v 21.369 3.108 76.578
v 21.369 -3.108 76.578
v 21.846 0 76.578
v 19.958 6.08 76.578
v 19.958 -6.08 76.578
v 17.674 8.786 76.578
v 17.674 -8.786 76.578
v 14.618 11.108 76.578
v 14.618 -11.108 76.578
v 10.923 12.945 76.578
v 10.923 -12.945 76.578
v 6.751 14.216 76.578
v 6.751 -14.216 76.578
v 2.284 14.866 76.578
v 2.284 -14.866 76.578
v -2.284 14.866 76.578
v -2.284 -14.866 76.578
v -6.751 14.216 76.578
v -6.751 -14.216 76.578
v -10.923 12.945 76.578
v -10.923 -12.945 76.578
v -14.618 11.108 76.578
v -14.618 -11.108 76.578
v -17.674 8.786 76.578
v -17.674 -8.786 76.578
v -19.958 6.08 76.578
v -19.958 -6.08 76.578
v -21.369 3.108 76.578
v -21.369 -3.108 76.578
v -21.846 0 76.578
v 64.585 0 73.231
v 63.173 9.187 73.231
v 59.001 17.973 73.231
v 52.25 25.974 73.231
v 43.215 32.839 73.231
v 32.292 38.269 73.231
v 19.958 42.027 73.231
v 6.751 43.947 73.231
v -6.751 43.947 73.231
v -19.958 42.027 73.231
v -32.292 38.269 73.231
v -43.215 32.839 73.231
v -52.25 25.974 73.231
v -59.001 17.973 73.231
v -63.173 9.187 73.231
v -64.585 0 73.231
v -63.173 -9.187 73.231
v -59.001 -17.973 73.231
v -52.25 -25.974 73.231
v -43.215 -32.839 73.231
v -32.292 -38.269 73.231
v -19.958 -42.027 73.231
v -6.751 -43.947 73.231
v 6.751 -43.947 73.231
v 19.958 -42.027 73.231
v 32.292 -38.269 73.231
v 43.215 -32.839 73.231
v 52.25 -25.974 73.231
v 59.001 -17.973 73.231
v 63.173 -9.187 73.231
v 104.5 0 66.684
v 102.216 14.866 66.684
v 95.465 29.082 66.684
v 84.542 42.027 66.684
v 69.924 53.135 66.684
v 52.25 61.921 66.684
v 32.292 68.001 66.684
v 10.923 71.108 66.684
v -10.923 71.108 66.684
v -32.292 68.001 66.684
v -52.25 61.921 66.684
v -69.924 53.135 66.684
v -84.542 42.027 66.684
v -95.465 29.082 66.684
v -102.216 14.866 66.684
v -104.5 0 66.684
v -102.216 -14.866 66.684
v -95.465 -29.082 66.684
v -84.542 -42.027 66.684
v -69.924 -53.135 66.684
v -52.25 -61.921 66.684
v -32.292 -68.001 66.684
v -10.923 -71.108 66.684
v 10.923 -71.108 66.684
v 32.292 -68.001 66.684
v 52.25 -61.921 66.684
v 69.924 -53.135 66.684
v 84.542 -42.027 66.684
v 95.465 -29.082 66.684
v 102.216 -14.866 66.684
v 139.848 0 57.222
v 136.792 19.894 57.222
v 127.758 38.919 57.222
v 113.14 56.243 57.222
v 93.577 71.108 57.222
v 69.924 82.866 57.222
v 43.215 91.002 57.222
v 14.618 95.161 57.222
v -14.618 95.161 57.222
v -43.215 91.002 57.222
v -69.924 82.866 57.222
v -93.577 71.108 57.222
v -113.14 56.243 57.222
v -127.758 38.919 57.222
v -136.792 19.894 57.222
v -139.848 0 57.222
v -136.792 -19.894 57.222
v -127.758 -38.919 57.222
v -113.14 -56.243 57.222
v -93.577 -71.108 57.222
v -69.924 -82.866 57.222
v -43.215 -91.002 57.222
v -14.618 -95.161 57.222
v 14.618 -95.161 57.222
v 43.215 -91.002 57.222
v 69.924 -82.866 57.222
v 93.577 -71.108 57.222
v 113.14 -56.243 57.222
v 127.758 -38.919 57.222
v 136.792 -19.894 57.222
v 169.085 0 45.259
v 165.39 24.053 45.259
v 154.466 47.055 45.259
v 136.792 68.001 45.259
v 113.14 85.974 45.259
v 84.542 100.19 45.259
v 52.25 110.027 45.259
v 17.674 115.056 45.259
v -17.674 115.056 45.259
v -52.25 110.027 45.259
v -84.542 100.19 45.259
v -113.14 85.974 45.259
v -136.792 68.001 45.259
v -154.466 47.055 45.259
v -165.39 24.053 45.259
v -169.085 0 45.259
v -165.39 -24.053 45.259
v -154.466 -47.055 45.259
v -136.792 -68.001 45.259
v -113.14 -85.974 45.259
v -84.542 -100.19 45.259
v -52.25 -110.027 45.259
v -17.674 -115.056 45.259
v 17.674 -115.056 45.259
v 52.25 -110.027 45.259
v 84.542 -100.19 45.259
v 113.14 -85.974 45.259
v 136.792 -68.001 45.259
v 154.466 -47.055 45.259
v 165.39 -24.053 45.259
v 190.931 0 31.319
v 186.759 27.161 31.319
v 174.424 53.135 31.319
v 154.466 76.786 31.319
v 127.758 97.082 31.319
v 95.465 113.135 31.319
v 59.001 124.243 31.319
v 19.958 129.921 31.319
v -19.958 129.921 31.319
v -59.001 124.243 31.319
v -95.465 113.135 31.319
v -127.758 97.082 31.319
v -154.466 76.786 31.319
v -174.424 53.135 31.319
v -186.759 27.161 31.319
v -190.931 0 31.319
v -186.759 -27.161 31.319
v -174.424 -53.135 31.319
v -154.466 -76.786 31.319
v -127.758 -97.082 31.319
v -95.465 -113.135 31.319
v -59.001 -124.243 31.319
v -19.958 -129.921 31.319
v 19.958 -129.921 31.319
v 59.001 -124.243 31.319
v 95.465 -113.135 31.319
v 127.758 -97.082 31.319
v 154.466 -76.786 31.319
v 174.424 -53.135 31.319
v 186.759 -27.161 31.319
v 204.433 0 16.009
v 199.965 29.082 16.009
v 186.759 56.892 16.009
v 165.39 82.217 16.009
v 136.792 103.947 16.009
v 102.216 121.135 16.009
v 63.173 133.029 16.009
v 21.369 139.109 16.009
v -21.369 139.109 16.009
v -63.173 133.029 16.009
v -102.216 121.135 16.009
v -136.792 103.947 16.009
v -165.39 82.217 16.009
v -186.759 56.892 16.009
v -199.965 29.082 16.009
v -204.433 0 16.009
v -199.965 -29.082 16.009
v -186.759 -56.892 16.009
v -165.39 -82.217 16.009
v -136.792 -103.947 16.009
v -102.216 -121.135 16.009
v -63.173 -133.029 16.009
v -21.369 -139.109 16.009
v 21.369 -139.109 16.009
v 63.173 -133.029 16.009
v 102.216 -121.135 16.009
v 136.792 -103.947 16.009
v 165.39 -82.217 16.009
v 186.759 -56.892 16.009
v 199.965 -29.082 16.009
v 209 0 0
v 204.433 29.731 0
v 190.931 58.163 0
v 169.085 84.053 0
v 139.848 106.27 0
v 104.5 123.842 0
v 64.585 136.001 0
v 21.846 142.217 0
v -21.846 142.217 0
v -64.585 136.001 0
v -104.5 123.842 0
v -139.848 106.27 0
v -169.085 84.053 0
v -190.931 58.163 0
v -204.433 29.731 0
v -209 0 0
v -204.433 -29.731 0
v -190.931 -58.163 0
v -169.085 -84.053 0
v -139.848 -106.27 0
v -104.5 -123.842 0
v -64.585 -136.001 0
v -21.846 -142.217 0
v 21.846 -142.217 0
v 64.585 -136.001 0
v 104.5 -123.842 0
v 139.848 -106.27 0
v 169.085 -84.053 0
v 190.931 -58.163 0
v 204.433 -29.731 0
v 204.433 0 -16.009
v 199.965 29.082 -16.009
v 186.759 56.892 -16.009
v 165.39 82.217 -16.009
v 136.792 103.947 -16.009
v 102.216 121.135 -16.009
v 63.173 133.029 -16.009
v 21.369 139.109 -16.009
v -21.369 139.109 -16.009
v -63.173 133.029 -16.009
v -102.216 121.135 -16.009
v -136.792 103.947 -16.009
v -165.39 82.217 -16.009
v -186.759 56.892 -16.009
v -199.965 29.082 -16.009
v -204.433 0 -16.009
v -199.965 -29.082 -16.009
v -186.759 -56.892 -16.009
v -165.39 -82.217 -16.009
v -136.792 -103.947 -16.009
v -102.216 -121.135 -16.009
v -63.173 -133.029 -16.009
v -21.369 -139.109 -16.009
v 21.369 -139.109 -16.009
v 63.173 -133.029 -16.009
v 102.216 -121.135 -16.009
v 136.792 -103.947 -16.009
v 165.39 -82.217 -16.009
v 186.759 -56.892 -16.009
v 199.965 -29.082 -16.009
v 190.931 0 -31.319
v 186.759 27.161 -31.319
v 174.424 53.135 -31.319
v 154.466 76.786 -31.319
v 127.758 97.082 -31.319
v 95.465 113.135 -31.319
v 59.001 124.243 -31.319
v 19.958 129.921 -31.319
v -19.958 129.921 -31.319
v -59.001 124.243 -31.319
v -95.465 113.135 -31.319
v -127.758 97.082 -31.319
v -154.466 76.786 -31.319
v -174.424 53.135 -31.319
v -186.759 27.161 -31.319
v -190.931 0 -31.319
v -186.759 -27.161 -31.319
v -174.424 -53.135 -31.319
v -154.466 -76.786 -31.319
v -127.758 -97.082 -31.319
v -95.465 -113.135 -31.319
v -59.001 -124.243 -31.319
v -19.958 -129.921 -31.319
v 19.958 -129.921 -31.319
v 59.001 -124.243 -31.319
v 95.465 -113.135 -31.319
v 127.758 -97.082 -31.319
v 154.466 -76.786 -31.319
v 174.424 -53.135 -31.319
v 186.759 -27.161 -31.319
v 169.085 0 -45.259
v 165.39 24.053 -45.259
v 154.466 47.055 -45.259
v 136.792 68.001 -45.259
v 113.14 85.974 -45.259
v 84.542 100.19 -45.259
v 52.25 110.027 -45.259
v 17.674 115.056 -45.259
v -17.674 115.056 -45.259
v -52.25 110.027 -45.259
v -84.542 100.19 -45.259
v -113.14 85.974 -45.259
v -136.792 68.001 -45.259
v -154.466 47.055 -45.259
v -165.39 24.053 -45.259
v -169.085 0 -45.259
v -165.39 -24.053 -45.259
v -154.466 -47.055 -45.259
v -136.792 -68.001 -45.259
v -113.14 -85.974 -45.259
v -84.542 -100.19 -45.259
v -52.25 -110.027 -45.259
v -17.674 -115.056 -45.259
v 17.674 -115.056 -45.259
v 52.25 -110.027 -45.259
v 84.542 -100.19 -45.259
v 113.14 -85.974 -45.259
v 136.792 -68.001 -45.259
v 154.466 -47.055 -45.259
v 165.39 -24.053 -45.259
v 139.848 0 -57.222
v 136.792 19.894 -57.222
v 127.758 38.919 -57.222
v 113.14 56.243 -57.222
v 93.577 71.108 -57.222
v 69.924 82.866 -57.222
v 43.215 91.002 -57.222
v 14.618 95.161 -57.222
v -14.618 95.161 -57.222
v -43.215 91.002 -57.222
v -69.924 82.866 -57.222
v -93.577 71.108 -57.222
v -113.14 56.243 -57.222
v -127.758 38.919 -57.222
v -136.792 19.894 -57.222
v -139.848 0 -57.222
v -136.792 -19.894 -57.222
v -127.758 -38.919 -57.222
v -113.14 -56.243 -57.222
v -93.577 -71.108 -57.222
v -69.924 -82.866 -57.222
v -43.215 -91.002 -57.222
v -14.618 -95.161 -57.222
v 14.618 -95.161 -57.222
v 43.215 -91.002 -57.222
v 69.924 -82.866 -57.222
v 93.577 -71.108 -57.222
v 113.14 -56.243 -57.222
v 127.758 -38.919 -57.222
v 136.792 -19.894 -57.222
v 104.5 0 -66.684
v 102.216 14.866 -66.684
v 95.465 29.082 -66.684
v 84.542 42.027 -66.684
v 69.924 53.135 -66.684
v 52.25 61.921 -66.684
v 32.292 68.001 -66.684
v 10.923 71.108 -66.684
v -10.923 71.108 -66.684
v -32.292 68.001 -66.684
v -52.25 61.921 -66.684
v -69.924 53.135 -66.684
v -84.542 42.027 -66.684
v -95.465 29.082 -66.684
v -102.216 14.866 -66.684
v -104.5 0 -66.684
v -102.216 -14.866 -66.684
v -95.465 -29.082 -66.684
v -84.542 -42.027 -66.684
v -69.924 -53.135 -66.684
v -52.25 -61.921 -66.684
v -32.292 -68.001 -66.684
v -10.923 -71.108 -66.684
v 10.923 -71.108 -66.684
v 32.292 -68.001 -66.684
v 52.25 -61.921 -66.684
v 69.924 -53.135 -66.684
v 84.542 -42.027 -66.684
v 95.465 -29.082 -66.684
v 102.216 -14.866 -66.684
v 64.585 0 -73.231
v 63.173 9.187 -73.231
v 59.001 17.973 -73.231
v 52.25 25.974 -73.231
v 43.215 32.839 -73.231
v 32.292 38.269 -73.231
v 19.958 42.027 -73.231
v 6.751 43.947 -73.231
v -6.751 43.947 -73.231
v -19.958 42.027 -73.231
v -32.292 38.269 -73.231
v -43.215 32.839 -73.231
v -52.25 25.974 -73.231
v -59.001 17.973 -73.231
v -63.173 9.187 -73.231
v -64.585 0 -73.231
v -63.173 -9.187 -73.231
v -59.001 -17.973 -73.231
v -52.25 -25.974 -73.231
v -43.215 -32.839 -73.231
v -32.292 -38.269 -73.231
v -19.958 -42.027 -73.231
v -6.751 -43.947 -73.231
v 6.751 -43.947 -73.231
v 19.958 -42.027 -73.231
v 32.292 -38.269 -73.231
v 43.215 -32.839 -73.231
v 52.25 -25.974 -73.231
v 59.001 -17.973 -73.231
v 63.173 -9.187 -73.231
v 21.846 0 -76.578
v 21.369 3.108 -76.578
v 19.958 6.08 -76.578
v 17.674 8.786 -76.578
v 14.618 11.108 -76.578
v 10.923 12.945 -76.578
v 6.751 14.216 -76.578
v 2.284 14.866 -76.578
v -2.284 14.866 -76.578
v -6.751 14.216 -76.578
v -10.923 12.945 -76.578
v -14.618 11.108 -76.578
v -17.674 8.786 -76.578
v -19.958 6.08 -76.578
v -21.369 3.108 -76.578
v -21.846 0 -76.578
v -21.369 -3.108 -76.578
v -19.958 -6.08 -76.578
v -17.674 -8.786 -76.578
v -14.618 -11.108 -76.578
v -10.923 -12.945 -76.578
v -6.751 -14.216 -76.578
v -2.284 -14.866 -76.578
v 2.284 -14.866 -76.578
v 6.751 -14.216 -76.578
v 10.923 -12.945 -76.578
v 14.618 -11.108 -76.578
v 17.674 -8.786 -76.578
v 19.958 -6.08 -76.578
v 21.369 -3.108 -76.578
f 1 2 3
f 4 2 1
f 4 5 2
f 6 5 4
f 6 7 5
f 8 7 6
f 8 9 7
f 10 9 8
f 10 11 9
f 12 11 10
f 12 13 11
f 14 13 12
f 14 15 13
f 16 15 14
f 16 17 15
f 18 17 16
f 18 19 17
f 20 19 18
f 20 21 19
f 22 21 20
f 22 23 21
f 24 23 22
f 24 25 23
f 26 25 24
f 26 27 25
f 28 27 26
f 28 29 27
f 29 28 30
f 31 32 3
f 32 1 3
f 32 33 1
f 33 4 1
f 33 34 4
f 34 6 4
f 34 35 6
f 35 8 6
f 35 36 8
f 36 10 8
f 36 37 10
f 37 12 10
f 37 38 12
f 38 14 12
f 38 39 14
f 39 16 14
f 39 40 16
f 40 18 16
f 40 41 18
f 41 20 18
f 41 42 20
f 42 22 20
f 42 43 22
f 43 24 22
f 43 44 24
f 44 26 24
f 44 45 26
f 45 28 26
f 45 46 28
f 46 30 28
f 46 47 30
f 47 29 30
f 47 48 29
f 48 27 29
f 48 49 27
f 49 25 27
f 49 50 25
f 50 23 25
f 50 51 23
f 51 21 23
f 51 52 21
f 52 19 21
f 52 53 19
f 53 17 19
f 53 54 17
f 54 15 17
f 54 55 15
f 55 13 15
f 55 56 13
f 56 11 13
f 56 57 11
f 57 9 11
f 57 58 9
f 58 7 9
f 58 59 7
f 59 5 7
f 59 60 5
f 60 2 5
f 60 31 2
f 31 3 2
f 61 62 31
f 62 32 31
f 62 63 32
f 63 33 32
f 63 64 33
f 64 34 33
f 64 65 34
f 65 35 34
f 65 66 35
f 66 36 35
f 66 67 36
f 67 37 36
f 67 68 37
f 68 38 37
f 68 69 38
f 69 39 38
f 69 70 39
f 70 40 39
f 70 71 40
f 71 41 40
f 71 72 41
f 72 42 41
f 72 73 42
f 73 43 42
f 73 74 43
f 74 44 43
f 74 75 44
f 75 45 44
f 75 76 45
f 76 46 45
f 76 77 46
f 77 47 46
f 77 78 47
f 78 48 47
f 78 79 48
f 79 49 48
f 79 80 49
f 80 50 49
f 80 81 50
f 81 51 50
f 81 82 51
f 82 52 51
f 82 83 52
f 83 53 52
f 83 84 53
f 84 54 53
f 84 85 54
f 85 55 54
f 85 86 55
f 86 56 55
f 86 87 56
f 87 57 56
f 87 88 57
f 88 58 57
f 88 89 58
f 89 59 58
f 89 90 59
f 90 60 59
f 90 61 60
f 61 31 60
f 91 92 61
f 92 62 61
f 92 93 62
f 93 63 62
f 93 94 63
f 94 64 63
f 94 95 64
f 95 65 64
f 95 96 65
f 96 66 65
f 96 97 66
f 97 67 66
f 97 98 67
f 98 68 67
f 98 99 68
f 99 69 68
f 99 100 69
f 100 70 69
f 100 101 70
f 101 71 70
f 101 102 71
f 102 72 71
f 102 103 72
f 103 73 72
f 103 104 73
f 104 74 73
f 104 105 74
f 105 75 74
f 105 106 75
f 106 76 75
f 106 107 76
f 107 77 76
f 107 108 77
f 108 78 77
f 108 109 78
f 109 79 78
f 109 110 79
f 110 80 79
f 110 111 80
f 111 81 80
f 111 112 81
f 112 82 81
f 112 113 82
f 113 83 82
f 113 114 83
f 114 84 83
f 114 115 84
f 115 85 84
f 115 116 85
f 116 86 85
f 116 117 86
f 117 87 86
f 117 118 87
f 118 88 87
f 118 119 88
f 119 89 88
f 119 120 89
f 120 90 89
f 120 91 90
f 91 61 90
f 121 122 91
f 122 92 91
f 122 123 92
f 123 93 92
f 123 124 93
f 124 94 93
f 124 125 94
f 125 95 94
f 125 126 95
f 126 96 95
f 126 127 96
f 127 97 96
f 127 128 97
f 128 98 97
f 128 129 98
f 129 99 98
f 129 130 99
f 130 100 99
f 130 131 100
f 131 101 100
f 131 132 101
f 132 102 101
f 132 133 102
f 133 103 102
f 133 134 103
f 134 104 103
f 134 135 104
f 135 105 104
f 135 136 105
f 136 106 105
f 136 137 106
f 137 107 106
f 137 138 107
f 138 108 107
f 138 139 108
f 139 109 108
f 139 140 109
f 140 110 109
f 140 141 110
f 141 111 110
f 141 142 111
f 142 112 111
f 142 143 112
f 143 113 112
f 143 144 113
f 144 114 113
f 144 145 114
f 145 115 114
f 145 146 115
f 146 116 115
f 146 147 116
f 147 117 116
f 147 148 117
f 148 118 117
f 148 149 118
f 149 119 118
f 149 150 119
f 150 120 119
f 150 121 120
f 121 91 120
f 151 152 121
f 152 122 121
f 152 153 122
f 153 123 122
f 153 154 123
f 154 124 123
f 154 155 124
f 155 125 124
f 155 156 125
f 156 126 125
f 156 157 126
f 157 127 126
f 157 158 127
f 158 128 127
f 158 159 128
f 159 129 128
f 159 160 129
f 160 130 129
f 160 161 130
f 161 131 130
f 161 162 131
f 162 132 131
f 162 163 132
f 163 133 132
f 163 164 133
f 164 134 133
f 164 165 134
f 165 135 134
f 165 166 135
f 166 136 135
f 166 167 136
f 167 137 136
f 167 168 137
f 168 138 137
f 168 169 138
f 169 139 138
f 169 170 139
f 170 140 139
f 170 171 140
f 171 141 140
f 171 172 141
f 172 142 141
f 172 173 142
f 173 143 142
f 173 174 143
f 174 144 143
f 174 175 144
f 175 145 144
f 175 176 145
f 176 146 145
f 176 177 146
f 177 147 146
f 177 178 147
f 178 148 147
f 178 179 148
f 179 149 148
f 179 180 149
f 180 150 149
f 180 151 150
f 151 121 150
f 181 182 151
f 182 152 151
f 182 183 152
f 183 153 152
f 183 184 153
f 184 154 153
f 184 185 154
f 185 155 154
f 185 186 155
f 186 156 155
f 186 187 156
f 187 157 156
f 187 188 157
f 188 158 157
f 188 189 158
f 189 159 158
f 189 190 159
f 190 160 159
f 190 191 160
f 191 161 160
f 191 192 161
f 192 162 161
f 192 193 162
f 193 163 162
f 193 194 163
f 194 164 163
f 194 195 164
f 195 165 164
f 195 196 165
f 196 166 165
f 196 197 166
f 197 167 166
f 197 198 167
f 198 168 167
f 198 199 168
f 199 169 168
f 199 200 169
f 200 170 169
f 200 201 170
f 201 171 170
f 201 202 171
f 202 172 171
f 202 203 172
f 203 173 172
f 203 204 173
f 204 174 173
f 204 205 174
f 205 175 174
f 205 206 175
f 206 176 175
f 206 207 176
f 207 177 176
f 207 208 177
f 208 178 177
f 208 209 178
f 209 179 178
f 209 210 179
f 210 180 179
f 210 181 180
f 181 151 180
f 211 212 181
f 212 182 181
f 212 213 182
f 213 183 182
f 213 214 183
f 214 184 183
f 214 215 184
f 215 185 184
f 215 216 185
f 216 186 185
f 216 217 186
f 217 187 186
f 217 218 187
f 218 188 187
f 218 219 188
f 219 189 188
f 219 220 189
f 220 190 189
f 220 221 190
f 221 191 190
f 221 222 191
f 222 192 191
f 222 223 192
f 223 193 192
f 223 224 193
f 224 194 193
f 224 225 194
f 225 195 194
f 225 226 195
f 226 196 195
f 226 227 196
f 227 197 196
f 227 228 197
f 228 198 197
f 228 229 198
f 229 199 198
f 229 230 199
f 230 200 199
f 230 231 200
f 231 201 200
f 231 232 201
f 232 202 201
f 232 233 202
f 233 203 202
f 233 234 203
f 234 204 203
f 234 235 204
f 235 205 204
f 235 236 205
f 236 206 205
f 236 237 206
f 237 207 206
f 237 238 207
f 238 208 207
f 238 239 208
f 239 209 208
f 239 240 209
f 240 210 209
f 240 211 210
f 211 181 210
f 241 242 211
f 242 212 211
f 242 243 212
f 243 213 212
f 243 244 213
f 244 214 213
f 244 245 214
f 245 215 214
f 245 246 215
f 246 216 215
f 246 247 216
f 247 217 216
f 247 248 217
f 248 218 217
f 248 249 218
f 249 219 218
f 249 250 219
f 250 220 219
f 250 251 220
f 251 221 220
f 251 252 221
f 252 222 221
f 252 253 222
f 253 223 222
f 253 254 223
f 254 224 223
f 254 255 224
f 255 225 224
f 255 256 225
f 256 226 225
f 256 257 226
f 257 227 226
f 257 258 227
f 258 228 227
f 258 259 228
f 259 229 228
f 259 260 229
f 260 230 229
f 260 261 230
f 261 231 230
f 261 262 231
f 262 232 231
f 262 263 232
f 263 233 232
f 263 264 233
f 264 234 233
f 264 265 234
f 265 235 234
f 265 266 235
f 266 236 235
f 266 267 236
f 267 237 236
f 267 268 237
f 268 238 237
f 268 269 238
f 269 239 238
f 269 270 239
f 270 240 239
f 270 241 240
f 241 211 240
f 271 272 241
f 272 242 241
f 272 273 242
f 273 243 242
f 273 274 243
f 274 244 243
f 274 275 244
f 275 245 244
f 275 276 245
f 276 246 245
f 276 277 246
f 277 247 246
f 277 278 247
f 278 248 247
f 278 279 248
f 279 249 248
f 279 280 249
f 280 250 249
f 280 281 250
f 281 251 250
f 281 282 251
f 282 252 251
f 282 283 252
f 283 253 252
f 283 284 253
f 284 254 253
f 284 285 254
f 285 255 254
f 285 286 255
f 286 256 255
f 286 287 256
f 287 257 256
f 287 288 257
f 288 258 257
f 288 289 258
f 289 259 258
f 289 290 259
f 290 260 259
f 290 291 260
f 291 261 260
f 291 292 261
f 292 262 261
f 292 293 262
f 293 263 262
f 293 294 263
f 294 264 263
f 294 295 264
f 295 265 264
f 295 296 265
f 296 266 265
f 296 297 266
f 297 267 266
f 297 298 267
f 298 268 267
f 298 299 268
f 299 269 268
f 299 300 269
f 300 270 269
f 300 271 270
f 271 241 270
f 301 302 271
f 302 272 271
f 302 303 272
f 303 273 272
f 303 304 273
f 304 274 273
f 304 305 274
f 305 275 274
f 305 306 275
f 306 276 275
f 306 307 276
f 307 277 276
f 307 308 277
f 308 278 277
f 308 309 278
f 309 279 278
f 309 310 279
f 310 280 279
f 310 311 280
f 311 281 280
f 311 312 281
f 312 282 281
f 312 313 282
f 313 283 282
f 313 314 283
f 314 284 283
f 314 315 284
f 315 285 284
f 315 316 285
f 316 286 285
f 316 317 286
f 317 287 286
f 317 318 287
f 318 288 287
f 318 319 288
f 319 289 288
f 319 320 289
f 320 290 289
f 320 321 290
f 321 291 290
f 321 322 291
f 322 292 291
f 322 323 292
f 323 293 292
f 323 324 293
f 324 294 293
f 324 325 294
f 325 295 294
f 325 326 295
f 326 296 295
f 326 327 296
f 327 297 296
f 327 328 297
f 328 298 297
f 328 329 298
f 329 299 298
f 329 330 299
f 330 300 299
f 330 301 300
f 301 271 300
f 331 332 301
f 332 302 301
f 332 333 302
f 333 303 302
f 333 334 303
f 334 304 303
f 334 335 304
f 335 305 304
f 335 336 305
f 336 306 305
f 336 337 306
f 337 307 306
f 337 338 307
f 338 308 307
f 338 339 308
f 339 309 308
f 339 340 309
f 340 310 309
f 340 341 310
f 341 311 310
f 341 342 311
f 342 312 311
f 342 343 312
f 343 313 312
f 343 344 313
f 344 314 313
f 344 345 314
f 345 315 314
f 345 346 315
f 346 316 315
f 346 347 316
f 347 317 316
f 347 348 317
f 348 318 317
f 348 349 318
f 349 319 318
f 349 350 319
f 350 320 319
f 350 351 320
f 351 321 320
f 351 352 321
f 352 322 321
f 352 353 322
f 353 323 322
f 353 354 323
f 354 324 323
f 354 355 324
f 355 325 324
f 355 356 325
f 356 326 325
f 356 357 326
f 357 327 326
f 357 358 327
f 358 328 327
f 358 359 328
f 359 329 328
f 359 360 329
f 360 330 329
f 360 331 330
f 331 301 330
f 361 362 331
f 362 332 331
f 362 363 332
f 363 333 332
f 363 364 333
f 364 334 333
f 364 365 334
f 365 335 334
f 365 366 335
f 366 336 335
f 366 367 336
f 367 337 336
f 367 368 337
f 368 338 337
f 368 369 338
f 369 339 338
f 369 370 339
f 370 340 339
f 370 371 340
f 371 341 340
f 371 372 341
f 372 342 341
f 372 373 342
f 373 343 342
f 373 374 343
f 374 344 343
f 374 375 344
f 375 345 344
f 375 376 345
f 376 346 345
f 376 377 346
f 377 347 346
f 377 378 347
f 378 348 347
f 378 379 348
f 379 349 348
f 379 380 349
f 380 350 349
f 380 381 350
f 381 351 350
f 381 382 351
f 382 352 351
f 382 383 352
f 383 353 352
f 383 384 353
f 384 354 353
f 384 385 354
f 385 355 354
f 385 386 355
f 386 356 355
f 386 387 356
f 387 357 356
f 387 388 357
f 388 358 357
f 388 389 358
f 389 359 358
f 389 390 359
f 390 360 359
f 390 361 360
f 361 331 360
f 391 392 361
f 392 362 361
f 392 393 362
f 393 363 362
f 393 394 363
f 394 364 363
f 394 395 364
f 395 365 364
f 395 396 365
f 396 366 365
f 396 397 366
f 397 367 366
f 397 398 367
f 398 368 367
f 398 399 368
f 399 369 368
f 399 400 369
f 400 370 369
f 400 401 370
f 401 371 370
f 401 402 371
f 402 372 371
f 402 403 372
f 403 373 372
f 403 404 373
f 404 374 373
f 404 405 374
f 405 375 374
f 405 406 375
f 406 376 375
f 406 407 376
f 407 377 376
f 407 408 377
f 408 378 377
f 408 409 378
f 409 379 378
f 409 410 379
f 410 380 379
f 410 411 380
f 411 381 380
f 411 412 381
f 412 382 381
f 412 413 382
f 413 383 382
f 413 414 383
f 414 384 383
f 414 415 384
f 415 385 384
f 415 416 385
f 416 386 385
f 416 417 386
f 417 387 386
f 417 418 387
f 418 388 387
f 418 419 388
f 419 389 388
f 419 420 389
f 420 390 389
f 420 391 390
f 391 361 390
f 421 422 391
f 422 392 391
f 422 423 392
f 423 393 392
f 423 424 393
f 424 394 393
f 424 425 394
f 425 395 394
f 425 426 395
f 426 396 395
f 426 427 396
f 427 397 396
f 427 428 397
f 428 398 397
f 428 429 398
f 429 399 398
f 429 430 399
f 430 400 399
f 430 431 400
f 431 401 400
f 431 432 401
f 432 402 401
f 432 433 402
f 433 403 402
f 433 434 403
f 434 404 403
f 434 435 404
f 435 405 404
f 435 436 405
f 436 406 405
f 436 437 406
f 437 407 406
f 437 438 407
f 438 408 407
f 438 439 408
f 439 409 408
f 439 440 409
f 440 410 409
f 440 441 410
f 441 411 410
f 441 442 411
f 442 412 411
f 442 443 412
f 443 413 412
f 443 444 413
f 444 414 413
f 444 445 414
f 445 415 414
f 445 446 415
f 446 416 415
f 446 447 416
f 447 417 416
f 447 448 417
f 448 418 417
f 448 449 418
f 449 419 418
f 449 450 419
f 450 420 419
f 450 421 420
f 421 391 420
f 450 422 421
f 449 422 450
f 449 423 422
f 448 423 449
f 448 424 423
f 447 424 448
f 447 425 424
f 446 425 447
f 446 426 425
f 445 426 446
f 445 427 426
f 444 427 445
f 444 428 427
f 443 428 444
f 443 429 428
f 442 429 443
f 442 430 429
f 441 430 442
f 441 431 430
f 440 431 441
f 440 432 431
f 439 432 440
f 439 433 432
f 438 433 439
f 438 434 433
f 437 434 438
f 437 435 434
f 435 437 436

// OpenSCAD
// Generated by SolidPython 1.0.1 on 2020-07-29 00:46:54


scale(v = [19, 13, 7]) {
	sphere(r = 11);
}
/***********************************************
*********      SolidPython code:      **********
************************************************
 
# import packages: SolidPython
from solid import *
from solid.utils import *
from itertools import chain, combinations, permutations


class Resize:

    def __init__(self, scad_file):
        self.scad_file = scad_file
        #self.scad_file = import_scad(scad_file)
        # cone/cylinder param:
        self.r1 = 0
        self.r2 = 0
        self.h = 0
        # rectangular prism param:
        self.w = 0
        self.l = 0
        # ellipse param:
        self.r = 0

    # import OpenScad code (file name corresponds to shape)


    # classify shape + parameters
    def assign(self, param1, param2, param3):
        if self.scad_file == 'cone.scad':
            self.r1 = param1
            self.r2 = param2
            self.h = param3
        elif self.scad_file == 'cylinder.scad':
            self.r1 = param1
            self.r2 = param2
            self.h = param3
        elif self.scad_file == 'rectangularPrism.scad':
            self.h = param1
            self.l = param2
            self.w = param3
        else:
            self.r = param1
            self.h = param2

    # resize parameters
    def iterate(self):
        x = range(3, 20, 2)
        i = 1
        if self.scad_file == 'cone.scad':
            tempList = list(permutations(x, 2))
            for temp in tempList:
                param1 = temp[0]
                param2 = temp[1]
                filepath = 'produced_scad_files/' + 'cone' + str(param1) + '_' + str(param2) + '_' + '.scad'
                scad_render_to_file(cylinder(h=param1, r1=param2, r2=0), filepath)

        elif self.scad_file == 'cylinder.scad':
            tempList = list(permutations(x, 3))
            for temp in tempList:
                param1 = temp[0]
                param2 = temp[1]
                filepath = 'produced_scad_files/' + 'cylinder' + str(param1) + '_' + str(param2) + '_' + '.scad'
                scad_render_to_file(cylinder(h=param1, r1=param2, r2=param2), filepath)

        elif self.scad_file == 'rectangularPrism.scad':
            tempList = list(permutations(x, 3))
            for temp in tempList:
                param1 = temp[0]
                param2 = temp[1]
                param3 = temp[2]
                filepath = 'produced_scad_files/' + 'rectangularPrism' + str(param1) + '_' + str(param2) + '_' + str(
                    param3) + '.scad'
                scad_render_to_file(cube(size=(param1, param2, param3)), filepath)

        elif self.scad_file == 'ellipse.scad':
            tempList = list(permutations(x, 4))
            for temp in tempList:
                param1 = temp[0]
                param2 = temp[1]
                param3 = temp[2]
                param4 = temp[3]
                filepath = 'produced_scad_files/' + 'ellipse' + str(param1) + '_' + str(param2) + '_' + str(param3) + '_' + str(param4) + '.scad'
                scad_render_to_file(scale([param1, param2, param3])(sphere(r=param4)), filepath)

    def render_to_scadfile(self):
        scad_render_to_file(scad, 'example.scad') 
 
************************************************/
